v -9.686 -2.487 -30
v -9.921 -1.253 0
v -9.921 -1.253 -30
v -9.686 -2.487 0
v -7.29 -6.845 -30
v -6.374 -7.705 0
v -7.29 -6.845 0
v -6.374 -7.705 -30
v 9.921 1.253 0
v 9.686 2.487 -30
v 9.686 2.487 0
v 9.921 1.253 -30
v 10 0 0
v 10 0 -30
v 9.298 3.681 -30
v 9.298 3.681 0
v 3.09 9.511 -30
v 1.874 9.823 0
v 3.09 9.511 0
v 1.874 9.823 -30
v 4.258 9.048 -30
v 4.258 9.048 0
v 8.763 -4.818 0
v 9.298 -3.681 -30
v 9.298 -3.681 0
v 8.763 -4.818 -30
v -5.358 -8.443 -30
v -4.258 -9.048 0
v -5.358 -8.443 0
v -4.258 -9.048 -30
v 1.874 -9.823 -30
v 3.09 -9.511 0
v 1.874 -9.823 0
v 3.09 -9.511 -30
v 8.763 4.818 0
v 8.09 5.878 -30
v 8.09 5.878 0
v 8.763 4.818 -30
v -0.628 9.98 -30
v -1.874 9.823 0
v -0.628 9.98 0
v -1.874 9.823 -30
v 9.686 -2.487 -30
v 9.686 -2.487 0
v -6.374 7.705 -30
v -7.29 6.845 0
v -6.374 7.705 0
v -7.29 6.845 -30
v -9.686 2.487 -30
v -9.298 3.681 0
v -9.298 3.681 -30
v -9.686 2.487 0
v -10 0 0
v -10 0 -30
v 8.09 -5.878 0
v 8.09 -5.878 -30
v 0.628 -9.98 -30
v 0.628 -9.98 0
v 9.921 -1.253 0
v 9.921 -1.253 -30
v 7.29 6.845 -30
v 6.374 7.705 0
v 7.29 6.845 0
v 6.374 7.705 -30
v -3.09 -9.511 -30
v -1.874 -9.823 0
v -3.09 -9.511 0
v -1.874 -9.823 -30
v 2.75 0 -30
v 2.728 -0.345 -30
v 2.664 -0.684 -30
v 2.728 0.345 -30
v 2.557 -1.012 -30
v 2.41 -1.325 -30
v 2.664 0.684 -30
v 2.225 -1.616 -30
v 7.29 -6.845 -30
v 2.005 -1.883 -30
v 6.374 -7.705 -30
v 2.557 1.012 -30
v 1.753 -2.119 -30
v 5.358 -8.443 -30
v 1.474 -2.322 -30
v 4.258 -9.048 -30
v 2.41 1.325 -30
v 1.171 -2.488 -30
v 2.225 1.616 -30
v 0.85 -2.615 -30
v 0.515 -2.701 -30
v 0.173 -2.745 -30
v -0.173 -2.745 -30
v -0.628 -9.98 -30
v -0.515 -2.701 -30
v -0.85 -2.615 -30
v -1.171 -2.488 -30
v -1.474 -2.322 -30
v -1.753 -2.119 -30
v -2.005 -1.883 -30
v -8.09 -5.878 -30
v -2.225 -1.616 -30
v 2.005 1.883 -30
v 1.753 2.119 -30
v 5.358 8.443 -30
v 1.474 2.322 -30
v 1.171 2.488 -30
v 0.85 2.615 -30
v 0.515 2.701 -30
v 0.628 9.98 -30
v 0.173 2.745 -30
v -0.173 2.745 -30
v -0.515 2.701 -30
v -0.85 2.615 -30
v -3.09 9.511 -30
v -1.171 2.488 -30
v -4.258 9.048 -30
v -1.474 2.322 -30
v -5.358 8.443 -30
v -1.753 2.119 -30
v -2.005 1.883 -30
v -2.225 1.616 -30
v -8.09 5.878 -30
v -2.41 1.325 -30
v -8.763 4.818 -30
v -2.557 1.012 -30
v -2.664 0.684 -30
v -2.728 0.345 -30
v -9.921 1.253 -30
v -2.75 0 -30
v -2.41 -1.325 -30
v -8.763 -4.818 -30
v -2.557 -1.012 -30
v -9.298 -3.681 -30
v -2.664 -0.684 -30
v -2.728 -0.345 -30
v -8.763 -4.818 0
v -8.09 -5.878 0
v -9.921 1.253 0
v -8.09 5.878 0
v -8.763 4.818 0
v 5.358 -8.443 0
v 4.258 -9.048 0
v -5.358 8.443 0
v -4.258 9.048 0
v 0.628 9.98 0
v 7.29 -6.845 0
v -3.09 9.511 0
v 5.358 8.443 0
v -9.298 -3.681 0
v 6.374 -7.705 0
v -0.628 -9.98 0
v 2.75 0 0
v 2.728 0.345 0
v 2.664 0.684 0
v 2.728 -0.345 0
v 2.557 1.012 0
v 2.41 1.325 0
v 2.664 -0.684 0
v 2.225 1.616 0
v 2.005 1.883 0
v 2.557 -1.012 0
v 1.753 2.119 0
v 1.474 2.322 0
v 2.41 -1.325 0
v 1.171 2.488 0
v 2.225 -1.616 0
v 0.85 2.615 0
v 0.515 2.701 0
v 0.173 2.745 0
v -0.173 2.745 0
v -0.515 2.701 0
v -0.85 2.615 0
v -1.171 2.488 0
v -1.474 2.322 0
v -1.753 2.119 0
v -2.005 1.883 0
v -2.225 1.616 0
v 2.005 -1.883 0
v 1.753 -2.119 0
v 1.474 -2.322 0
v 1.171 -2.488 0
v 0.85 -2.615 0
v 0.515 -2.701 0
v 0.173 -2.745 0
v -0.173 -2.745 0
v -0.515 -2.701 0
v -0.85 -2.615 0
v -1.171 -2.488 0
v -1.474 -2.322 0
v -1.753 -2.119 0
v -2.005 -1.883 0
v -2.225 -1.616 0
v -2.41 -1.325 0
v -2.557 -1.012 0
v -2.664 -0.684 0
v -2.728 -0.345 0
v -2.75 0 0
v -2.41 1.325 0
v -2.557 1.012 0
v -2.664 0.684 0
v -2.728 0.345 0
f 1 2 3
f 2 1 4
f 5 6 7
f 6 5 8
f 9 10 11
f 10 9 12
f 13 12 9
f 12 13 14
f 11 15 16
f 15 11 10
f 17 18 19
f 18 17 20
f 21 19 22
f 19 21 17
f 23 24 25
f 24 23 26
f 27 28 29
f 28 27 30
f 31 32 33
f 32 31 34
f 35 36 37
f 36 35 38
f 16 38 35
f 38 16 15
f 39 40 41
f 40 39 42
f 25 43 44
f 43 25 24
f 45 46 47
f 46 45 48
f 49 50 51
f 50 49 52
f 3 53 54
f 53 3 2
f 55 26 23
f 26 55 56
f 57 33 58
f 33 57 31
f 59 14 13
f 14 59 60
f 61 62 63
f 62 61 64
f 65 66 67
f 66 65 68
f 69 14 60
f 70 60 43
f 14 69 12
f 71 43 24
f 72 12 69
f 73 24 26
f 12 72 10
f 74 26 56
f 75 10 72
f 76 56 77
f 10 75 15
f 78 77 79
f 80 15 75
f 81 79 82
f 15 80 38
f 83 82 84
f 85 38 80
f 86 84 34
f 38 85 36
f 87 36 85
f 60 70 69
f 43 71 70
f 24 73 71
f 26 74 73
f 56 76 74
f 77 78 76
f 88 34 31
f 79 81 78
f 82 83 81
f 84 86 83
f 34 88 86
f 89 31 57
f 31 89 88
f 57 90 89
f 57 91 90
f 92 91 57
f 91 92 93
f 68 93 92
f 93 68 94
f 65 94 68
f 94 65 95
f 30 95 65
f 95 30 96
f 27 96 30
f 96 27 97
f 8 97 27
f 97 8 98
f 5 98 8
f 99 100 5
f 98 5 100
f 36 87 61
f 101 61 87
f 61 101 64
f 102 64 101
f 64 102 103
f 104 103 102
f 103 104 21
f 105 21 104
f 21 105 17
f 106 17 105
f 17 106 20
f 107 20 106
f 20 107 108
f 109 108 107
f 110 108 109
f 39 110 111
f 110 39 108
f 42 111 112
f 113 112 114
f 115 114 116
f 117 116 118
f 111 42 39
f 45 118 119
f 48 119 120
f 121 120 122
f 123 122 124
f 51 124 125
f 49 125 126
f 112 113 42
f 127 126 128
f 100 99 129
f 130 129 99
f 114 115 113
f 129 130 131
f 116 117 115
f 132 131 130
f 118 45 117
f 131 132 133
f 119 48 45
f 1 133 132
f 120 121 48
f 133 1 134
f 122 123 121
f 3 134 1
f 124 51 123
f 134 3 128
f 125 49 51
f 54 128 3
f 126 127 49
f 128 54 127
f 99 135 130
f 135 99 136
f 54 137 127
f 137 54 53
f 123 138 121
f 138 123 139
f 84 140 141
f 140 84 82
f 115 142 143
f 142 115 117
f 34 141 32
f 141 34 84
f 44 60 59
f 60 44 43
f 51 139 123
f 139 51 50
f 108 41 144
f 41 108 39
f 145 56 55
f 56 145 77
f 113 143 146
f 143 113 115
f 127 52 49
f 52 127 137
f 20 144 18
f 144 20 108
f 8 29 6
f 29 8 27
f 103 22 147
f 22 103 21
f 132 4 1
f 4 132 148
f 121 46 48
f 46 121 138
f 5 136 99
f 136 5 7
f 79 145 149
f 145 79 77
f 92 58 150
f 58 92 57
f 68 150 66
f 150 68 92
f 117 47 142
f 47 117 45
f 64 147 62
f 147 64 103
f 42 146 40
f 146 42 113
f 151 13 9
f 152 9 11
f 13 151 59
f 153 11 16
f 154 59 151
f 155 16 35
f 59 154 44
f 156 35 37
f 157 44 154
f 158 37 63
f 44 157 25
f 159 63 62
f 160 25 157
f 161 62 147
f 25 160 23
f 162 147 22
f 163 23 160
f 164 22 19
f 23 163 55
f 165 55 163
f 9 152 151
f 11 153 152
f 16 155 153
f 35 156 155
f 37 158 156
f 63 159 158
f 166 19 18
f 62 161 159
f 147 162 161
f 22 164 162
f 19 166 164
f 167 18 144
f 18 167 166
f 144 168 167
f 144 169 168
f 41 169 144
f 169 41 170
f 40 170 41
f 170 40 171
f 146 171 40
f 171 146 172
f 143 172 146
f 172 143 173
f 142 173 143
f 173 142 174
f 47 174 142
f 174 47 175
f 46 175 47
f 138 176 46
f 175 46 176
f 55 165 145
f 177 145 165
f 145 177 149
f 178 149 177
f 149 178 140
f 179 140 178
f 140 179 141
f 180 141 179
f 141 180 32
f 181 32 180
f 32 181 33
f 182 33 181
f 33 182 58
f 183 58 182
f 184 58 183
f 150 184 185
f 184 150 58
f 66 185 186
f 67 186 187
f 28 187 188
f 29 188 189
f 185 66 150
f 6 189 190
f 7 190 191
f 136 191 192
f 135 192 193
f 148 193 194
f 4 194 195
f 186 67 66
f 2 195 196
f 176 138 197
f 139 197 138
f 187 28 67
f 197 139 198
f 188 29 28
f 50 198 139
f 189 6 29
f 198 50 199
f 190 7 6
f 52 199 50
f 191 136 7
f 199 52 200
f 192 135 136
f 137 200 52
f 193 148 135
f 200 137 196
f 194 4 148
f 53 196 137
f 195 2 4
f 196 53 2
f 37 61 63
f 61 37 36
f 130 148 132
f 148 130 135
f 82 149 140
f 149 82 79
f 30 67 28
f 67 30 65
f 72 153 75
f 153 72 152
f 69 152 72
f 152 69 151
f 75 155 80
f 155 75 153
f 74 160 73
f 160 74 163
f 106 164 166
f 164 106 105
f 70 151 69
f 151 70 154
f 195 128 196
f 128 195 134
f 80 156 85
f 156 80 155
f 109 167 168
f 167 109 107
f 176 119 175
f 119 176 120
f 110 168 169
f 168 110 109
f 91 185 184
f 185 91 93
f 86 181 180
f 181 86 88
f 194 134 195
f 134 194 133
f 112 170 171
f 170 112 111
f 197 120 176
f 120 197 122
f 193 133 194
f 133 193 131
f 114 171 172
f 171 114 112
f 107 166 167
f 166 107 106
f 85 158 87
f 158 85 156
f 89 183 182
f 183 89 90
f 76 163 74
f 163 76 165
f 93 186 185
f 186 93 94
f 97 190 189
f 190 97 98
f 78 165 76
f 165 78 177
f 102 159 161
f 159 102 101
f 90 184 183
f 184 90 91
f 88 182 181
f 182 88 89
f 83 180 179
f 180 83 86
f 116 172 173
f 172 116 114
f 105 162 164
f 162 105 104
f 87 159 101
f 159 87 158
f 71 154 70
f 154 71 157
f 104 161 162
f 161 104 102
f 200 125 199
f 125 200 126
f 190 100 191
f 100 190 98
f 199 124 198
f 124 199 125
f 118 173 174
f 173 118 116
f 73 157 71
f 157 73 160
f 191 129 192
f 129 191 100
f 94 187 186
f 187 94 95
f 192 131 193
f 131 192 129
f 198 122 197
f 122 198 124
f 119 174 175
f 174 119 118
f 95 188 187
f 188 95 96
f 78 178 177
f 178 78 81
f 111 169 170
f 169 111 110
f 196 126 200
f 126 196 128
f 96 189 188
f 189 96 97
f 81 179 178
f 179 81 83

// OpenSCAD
$fn = 50;


difference() {
	union() {
		translate(v = [0, 0, -30.0000000000]) {
			cylinder(h = 30, r = 10.0000000000);
		}
		cylinder(h = 0, r = 19.0000000000);
	}
	union() {
		#translate(v = [0, 0, -30]) {
			cylinder(h = 30, r = 2.7500000000);
		}
	}
}
